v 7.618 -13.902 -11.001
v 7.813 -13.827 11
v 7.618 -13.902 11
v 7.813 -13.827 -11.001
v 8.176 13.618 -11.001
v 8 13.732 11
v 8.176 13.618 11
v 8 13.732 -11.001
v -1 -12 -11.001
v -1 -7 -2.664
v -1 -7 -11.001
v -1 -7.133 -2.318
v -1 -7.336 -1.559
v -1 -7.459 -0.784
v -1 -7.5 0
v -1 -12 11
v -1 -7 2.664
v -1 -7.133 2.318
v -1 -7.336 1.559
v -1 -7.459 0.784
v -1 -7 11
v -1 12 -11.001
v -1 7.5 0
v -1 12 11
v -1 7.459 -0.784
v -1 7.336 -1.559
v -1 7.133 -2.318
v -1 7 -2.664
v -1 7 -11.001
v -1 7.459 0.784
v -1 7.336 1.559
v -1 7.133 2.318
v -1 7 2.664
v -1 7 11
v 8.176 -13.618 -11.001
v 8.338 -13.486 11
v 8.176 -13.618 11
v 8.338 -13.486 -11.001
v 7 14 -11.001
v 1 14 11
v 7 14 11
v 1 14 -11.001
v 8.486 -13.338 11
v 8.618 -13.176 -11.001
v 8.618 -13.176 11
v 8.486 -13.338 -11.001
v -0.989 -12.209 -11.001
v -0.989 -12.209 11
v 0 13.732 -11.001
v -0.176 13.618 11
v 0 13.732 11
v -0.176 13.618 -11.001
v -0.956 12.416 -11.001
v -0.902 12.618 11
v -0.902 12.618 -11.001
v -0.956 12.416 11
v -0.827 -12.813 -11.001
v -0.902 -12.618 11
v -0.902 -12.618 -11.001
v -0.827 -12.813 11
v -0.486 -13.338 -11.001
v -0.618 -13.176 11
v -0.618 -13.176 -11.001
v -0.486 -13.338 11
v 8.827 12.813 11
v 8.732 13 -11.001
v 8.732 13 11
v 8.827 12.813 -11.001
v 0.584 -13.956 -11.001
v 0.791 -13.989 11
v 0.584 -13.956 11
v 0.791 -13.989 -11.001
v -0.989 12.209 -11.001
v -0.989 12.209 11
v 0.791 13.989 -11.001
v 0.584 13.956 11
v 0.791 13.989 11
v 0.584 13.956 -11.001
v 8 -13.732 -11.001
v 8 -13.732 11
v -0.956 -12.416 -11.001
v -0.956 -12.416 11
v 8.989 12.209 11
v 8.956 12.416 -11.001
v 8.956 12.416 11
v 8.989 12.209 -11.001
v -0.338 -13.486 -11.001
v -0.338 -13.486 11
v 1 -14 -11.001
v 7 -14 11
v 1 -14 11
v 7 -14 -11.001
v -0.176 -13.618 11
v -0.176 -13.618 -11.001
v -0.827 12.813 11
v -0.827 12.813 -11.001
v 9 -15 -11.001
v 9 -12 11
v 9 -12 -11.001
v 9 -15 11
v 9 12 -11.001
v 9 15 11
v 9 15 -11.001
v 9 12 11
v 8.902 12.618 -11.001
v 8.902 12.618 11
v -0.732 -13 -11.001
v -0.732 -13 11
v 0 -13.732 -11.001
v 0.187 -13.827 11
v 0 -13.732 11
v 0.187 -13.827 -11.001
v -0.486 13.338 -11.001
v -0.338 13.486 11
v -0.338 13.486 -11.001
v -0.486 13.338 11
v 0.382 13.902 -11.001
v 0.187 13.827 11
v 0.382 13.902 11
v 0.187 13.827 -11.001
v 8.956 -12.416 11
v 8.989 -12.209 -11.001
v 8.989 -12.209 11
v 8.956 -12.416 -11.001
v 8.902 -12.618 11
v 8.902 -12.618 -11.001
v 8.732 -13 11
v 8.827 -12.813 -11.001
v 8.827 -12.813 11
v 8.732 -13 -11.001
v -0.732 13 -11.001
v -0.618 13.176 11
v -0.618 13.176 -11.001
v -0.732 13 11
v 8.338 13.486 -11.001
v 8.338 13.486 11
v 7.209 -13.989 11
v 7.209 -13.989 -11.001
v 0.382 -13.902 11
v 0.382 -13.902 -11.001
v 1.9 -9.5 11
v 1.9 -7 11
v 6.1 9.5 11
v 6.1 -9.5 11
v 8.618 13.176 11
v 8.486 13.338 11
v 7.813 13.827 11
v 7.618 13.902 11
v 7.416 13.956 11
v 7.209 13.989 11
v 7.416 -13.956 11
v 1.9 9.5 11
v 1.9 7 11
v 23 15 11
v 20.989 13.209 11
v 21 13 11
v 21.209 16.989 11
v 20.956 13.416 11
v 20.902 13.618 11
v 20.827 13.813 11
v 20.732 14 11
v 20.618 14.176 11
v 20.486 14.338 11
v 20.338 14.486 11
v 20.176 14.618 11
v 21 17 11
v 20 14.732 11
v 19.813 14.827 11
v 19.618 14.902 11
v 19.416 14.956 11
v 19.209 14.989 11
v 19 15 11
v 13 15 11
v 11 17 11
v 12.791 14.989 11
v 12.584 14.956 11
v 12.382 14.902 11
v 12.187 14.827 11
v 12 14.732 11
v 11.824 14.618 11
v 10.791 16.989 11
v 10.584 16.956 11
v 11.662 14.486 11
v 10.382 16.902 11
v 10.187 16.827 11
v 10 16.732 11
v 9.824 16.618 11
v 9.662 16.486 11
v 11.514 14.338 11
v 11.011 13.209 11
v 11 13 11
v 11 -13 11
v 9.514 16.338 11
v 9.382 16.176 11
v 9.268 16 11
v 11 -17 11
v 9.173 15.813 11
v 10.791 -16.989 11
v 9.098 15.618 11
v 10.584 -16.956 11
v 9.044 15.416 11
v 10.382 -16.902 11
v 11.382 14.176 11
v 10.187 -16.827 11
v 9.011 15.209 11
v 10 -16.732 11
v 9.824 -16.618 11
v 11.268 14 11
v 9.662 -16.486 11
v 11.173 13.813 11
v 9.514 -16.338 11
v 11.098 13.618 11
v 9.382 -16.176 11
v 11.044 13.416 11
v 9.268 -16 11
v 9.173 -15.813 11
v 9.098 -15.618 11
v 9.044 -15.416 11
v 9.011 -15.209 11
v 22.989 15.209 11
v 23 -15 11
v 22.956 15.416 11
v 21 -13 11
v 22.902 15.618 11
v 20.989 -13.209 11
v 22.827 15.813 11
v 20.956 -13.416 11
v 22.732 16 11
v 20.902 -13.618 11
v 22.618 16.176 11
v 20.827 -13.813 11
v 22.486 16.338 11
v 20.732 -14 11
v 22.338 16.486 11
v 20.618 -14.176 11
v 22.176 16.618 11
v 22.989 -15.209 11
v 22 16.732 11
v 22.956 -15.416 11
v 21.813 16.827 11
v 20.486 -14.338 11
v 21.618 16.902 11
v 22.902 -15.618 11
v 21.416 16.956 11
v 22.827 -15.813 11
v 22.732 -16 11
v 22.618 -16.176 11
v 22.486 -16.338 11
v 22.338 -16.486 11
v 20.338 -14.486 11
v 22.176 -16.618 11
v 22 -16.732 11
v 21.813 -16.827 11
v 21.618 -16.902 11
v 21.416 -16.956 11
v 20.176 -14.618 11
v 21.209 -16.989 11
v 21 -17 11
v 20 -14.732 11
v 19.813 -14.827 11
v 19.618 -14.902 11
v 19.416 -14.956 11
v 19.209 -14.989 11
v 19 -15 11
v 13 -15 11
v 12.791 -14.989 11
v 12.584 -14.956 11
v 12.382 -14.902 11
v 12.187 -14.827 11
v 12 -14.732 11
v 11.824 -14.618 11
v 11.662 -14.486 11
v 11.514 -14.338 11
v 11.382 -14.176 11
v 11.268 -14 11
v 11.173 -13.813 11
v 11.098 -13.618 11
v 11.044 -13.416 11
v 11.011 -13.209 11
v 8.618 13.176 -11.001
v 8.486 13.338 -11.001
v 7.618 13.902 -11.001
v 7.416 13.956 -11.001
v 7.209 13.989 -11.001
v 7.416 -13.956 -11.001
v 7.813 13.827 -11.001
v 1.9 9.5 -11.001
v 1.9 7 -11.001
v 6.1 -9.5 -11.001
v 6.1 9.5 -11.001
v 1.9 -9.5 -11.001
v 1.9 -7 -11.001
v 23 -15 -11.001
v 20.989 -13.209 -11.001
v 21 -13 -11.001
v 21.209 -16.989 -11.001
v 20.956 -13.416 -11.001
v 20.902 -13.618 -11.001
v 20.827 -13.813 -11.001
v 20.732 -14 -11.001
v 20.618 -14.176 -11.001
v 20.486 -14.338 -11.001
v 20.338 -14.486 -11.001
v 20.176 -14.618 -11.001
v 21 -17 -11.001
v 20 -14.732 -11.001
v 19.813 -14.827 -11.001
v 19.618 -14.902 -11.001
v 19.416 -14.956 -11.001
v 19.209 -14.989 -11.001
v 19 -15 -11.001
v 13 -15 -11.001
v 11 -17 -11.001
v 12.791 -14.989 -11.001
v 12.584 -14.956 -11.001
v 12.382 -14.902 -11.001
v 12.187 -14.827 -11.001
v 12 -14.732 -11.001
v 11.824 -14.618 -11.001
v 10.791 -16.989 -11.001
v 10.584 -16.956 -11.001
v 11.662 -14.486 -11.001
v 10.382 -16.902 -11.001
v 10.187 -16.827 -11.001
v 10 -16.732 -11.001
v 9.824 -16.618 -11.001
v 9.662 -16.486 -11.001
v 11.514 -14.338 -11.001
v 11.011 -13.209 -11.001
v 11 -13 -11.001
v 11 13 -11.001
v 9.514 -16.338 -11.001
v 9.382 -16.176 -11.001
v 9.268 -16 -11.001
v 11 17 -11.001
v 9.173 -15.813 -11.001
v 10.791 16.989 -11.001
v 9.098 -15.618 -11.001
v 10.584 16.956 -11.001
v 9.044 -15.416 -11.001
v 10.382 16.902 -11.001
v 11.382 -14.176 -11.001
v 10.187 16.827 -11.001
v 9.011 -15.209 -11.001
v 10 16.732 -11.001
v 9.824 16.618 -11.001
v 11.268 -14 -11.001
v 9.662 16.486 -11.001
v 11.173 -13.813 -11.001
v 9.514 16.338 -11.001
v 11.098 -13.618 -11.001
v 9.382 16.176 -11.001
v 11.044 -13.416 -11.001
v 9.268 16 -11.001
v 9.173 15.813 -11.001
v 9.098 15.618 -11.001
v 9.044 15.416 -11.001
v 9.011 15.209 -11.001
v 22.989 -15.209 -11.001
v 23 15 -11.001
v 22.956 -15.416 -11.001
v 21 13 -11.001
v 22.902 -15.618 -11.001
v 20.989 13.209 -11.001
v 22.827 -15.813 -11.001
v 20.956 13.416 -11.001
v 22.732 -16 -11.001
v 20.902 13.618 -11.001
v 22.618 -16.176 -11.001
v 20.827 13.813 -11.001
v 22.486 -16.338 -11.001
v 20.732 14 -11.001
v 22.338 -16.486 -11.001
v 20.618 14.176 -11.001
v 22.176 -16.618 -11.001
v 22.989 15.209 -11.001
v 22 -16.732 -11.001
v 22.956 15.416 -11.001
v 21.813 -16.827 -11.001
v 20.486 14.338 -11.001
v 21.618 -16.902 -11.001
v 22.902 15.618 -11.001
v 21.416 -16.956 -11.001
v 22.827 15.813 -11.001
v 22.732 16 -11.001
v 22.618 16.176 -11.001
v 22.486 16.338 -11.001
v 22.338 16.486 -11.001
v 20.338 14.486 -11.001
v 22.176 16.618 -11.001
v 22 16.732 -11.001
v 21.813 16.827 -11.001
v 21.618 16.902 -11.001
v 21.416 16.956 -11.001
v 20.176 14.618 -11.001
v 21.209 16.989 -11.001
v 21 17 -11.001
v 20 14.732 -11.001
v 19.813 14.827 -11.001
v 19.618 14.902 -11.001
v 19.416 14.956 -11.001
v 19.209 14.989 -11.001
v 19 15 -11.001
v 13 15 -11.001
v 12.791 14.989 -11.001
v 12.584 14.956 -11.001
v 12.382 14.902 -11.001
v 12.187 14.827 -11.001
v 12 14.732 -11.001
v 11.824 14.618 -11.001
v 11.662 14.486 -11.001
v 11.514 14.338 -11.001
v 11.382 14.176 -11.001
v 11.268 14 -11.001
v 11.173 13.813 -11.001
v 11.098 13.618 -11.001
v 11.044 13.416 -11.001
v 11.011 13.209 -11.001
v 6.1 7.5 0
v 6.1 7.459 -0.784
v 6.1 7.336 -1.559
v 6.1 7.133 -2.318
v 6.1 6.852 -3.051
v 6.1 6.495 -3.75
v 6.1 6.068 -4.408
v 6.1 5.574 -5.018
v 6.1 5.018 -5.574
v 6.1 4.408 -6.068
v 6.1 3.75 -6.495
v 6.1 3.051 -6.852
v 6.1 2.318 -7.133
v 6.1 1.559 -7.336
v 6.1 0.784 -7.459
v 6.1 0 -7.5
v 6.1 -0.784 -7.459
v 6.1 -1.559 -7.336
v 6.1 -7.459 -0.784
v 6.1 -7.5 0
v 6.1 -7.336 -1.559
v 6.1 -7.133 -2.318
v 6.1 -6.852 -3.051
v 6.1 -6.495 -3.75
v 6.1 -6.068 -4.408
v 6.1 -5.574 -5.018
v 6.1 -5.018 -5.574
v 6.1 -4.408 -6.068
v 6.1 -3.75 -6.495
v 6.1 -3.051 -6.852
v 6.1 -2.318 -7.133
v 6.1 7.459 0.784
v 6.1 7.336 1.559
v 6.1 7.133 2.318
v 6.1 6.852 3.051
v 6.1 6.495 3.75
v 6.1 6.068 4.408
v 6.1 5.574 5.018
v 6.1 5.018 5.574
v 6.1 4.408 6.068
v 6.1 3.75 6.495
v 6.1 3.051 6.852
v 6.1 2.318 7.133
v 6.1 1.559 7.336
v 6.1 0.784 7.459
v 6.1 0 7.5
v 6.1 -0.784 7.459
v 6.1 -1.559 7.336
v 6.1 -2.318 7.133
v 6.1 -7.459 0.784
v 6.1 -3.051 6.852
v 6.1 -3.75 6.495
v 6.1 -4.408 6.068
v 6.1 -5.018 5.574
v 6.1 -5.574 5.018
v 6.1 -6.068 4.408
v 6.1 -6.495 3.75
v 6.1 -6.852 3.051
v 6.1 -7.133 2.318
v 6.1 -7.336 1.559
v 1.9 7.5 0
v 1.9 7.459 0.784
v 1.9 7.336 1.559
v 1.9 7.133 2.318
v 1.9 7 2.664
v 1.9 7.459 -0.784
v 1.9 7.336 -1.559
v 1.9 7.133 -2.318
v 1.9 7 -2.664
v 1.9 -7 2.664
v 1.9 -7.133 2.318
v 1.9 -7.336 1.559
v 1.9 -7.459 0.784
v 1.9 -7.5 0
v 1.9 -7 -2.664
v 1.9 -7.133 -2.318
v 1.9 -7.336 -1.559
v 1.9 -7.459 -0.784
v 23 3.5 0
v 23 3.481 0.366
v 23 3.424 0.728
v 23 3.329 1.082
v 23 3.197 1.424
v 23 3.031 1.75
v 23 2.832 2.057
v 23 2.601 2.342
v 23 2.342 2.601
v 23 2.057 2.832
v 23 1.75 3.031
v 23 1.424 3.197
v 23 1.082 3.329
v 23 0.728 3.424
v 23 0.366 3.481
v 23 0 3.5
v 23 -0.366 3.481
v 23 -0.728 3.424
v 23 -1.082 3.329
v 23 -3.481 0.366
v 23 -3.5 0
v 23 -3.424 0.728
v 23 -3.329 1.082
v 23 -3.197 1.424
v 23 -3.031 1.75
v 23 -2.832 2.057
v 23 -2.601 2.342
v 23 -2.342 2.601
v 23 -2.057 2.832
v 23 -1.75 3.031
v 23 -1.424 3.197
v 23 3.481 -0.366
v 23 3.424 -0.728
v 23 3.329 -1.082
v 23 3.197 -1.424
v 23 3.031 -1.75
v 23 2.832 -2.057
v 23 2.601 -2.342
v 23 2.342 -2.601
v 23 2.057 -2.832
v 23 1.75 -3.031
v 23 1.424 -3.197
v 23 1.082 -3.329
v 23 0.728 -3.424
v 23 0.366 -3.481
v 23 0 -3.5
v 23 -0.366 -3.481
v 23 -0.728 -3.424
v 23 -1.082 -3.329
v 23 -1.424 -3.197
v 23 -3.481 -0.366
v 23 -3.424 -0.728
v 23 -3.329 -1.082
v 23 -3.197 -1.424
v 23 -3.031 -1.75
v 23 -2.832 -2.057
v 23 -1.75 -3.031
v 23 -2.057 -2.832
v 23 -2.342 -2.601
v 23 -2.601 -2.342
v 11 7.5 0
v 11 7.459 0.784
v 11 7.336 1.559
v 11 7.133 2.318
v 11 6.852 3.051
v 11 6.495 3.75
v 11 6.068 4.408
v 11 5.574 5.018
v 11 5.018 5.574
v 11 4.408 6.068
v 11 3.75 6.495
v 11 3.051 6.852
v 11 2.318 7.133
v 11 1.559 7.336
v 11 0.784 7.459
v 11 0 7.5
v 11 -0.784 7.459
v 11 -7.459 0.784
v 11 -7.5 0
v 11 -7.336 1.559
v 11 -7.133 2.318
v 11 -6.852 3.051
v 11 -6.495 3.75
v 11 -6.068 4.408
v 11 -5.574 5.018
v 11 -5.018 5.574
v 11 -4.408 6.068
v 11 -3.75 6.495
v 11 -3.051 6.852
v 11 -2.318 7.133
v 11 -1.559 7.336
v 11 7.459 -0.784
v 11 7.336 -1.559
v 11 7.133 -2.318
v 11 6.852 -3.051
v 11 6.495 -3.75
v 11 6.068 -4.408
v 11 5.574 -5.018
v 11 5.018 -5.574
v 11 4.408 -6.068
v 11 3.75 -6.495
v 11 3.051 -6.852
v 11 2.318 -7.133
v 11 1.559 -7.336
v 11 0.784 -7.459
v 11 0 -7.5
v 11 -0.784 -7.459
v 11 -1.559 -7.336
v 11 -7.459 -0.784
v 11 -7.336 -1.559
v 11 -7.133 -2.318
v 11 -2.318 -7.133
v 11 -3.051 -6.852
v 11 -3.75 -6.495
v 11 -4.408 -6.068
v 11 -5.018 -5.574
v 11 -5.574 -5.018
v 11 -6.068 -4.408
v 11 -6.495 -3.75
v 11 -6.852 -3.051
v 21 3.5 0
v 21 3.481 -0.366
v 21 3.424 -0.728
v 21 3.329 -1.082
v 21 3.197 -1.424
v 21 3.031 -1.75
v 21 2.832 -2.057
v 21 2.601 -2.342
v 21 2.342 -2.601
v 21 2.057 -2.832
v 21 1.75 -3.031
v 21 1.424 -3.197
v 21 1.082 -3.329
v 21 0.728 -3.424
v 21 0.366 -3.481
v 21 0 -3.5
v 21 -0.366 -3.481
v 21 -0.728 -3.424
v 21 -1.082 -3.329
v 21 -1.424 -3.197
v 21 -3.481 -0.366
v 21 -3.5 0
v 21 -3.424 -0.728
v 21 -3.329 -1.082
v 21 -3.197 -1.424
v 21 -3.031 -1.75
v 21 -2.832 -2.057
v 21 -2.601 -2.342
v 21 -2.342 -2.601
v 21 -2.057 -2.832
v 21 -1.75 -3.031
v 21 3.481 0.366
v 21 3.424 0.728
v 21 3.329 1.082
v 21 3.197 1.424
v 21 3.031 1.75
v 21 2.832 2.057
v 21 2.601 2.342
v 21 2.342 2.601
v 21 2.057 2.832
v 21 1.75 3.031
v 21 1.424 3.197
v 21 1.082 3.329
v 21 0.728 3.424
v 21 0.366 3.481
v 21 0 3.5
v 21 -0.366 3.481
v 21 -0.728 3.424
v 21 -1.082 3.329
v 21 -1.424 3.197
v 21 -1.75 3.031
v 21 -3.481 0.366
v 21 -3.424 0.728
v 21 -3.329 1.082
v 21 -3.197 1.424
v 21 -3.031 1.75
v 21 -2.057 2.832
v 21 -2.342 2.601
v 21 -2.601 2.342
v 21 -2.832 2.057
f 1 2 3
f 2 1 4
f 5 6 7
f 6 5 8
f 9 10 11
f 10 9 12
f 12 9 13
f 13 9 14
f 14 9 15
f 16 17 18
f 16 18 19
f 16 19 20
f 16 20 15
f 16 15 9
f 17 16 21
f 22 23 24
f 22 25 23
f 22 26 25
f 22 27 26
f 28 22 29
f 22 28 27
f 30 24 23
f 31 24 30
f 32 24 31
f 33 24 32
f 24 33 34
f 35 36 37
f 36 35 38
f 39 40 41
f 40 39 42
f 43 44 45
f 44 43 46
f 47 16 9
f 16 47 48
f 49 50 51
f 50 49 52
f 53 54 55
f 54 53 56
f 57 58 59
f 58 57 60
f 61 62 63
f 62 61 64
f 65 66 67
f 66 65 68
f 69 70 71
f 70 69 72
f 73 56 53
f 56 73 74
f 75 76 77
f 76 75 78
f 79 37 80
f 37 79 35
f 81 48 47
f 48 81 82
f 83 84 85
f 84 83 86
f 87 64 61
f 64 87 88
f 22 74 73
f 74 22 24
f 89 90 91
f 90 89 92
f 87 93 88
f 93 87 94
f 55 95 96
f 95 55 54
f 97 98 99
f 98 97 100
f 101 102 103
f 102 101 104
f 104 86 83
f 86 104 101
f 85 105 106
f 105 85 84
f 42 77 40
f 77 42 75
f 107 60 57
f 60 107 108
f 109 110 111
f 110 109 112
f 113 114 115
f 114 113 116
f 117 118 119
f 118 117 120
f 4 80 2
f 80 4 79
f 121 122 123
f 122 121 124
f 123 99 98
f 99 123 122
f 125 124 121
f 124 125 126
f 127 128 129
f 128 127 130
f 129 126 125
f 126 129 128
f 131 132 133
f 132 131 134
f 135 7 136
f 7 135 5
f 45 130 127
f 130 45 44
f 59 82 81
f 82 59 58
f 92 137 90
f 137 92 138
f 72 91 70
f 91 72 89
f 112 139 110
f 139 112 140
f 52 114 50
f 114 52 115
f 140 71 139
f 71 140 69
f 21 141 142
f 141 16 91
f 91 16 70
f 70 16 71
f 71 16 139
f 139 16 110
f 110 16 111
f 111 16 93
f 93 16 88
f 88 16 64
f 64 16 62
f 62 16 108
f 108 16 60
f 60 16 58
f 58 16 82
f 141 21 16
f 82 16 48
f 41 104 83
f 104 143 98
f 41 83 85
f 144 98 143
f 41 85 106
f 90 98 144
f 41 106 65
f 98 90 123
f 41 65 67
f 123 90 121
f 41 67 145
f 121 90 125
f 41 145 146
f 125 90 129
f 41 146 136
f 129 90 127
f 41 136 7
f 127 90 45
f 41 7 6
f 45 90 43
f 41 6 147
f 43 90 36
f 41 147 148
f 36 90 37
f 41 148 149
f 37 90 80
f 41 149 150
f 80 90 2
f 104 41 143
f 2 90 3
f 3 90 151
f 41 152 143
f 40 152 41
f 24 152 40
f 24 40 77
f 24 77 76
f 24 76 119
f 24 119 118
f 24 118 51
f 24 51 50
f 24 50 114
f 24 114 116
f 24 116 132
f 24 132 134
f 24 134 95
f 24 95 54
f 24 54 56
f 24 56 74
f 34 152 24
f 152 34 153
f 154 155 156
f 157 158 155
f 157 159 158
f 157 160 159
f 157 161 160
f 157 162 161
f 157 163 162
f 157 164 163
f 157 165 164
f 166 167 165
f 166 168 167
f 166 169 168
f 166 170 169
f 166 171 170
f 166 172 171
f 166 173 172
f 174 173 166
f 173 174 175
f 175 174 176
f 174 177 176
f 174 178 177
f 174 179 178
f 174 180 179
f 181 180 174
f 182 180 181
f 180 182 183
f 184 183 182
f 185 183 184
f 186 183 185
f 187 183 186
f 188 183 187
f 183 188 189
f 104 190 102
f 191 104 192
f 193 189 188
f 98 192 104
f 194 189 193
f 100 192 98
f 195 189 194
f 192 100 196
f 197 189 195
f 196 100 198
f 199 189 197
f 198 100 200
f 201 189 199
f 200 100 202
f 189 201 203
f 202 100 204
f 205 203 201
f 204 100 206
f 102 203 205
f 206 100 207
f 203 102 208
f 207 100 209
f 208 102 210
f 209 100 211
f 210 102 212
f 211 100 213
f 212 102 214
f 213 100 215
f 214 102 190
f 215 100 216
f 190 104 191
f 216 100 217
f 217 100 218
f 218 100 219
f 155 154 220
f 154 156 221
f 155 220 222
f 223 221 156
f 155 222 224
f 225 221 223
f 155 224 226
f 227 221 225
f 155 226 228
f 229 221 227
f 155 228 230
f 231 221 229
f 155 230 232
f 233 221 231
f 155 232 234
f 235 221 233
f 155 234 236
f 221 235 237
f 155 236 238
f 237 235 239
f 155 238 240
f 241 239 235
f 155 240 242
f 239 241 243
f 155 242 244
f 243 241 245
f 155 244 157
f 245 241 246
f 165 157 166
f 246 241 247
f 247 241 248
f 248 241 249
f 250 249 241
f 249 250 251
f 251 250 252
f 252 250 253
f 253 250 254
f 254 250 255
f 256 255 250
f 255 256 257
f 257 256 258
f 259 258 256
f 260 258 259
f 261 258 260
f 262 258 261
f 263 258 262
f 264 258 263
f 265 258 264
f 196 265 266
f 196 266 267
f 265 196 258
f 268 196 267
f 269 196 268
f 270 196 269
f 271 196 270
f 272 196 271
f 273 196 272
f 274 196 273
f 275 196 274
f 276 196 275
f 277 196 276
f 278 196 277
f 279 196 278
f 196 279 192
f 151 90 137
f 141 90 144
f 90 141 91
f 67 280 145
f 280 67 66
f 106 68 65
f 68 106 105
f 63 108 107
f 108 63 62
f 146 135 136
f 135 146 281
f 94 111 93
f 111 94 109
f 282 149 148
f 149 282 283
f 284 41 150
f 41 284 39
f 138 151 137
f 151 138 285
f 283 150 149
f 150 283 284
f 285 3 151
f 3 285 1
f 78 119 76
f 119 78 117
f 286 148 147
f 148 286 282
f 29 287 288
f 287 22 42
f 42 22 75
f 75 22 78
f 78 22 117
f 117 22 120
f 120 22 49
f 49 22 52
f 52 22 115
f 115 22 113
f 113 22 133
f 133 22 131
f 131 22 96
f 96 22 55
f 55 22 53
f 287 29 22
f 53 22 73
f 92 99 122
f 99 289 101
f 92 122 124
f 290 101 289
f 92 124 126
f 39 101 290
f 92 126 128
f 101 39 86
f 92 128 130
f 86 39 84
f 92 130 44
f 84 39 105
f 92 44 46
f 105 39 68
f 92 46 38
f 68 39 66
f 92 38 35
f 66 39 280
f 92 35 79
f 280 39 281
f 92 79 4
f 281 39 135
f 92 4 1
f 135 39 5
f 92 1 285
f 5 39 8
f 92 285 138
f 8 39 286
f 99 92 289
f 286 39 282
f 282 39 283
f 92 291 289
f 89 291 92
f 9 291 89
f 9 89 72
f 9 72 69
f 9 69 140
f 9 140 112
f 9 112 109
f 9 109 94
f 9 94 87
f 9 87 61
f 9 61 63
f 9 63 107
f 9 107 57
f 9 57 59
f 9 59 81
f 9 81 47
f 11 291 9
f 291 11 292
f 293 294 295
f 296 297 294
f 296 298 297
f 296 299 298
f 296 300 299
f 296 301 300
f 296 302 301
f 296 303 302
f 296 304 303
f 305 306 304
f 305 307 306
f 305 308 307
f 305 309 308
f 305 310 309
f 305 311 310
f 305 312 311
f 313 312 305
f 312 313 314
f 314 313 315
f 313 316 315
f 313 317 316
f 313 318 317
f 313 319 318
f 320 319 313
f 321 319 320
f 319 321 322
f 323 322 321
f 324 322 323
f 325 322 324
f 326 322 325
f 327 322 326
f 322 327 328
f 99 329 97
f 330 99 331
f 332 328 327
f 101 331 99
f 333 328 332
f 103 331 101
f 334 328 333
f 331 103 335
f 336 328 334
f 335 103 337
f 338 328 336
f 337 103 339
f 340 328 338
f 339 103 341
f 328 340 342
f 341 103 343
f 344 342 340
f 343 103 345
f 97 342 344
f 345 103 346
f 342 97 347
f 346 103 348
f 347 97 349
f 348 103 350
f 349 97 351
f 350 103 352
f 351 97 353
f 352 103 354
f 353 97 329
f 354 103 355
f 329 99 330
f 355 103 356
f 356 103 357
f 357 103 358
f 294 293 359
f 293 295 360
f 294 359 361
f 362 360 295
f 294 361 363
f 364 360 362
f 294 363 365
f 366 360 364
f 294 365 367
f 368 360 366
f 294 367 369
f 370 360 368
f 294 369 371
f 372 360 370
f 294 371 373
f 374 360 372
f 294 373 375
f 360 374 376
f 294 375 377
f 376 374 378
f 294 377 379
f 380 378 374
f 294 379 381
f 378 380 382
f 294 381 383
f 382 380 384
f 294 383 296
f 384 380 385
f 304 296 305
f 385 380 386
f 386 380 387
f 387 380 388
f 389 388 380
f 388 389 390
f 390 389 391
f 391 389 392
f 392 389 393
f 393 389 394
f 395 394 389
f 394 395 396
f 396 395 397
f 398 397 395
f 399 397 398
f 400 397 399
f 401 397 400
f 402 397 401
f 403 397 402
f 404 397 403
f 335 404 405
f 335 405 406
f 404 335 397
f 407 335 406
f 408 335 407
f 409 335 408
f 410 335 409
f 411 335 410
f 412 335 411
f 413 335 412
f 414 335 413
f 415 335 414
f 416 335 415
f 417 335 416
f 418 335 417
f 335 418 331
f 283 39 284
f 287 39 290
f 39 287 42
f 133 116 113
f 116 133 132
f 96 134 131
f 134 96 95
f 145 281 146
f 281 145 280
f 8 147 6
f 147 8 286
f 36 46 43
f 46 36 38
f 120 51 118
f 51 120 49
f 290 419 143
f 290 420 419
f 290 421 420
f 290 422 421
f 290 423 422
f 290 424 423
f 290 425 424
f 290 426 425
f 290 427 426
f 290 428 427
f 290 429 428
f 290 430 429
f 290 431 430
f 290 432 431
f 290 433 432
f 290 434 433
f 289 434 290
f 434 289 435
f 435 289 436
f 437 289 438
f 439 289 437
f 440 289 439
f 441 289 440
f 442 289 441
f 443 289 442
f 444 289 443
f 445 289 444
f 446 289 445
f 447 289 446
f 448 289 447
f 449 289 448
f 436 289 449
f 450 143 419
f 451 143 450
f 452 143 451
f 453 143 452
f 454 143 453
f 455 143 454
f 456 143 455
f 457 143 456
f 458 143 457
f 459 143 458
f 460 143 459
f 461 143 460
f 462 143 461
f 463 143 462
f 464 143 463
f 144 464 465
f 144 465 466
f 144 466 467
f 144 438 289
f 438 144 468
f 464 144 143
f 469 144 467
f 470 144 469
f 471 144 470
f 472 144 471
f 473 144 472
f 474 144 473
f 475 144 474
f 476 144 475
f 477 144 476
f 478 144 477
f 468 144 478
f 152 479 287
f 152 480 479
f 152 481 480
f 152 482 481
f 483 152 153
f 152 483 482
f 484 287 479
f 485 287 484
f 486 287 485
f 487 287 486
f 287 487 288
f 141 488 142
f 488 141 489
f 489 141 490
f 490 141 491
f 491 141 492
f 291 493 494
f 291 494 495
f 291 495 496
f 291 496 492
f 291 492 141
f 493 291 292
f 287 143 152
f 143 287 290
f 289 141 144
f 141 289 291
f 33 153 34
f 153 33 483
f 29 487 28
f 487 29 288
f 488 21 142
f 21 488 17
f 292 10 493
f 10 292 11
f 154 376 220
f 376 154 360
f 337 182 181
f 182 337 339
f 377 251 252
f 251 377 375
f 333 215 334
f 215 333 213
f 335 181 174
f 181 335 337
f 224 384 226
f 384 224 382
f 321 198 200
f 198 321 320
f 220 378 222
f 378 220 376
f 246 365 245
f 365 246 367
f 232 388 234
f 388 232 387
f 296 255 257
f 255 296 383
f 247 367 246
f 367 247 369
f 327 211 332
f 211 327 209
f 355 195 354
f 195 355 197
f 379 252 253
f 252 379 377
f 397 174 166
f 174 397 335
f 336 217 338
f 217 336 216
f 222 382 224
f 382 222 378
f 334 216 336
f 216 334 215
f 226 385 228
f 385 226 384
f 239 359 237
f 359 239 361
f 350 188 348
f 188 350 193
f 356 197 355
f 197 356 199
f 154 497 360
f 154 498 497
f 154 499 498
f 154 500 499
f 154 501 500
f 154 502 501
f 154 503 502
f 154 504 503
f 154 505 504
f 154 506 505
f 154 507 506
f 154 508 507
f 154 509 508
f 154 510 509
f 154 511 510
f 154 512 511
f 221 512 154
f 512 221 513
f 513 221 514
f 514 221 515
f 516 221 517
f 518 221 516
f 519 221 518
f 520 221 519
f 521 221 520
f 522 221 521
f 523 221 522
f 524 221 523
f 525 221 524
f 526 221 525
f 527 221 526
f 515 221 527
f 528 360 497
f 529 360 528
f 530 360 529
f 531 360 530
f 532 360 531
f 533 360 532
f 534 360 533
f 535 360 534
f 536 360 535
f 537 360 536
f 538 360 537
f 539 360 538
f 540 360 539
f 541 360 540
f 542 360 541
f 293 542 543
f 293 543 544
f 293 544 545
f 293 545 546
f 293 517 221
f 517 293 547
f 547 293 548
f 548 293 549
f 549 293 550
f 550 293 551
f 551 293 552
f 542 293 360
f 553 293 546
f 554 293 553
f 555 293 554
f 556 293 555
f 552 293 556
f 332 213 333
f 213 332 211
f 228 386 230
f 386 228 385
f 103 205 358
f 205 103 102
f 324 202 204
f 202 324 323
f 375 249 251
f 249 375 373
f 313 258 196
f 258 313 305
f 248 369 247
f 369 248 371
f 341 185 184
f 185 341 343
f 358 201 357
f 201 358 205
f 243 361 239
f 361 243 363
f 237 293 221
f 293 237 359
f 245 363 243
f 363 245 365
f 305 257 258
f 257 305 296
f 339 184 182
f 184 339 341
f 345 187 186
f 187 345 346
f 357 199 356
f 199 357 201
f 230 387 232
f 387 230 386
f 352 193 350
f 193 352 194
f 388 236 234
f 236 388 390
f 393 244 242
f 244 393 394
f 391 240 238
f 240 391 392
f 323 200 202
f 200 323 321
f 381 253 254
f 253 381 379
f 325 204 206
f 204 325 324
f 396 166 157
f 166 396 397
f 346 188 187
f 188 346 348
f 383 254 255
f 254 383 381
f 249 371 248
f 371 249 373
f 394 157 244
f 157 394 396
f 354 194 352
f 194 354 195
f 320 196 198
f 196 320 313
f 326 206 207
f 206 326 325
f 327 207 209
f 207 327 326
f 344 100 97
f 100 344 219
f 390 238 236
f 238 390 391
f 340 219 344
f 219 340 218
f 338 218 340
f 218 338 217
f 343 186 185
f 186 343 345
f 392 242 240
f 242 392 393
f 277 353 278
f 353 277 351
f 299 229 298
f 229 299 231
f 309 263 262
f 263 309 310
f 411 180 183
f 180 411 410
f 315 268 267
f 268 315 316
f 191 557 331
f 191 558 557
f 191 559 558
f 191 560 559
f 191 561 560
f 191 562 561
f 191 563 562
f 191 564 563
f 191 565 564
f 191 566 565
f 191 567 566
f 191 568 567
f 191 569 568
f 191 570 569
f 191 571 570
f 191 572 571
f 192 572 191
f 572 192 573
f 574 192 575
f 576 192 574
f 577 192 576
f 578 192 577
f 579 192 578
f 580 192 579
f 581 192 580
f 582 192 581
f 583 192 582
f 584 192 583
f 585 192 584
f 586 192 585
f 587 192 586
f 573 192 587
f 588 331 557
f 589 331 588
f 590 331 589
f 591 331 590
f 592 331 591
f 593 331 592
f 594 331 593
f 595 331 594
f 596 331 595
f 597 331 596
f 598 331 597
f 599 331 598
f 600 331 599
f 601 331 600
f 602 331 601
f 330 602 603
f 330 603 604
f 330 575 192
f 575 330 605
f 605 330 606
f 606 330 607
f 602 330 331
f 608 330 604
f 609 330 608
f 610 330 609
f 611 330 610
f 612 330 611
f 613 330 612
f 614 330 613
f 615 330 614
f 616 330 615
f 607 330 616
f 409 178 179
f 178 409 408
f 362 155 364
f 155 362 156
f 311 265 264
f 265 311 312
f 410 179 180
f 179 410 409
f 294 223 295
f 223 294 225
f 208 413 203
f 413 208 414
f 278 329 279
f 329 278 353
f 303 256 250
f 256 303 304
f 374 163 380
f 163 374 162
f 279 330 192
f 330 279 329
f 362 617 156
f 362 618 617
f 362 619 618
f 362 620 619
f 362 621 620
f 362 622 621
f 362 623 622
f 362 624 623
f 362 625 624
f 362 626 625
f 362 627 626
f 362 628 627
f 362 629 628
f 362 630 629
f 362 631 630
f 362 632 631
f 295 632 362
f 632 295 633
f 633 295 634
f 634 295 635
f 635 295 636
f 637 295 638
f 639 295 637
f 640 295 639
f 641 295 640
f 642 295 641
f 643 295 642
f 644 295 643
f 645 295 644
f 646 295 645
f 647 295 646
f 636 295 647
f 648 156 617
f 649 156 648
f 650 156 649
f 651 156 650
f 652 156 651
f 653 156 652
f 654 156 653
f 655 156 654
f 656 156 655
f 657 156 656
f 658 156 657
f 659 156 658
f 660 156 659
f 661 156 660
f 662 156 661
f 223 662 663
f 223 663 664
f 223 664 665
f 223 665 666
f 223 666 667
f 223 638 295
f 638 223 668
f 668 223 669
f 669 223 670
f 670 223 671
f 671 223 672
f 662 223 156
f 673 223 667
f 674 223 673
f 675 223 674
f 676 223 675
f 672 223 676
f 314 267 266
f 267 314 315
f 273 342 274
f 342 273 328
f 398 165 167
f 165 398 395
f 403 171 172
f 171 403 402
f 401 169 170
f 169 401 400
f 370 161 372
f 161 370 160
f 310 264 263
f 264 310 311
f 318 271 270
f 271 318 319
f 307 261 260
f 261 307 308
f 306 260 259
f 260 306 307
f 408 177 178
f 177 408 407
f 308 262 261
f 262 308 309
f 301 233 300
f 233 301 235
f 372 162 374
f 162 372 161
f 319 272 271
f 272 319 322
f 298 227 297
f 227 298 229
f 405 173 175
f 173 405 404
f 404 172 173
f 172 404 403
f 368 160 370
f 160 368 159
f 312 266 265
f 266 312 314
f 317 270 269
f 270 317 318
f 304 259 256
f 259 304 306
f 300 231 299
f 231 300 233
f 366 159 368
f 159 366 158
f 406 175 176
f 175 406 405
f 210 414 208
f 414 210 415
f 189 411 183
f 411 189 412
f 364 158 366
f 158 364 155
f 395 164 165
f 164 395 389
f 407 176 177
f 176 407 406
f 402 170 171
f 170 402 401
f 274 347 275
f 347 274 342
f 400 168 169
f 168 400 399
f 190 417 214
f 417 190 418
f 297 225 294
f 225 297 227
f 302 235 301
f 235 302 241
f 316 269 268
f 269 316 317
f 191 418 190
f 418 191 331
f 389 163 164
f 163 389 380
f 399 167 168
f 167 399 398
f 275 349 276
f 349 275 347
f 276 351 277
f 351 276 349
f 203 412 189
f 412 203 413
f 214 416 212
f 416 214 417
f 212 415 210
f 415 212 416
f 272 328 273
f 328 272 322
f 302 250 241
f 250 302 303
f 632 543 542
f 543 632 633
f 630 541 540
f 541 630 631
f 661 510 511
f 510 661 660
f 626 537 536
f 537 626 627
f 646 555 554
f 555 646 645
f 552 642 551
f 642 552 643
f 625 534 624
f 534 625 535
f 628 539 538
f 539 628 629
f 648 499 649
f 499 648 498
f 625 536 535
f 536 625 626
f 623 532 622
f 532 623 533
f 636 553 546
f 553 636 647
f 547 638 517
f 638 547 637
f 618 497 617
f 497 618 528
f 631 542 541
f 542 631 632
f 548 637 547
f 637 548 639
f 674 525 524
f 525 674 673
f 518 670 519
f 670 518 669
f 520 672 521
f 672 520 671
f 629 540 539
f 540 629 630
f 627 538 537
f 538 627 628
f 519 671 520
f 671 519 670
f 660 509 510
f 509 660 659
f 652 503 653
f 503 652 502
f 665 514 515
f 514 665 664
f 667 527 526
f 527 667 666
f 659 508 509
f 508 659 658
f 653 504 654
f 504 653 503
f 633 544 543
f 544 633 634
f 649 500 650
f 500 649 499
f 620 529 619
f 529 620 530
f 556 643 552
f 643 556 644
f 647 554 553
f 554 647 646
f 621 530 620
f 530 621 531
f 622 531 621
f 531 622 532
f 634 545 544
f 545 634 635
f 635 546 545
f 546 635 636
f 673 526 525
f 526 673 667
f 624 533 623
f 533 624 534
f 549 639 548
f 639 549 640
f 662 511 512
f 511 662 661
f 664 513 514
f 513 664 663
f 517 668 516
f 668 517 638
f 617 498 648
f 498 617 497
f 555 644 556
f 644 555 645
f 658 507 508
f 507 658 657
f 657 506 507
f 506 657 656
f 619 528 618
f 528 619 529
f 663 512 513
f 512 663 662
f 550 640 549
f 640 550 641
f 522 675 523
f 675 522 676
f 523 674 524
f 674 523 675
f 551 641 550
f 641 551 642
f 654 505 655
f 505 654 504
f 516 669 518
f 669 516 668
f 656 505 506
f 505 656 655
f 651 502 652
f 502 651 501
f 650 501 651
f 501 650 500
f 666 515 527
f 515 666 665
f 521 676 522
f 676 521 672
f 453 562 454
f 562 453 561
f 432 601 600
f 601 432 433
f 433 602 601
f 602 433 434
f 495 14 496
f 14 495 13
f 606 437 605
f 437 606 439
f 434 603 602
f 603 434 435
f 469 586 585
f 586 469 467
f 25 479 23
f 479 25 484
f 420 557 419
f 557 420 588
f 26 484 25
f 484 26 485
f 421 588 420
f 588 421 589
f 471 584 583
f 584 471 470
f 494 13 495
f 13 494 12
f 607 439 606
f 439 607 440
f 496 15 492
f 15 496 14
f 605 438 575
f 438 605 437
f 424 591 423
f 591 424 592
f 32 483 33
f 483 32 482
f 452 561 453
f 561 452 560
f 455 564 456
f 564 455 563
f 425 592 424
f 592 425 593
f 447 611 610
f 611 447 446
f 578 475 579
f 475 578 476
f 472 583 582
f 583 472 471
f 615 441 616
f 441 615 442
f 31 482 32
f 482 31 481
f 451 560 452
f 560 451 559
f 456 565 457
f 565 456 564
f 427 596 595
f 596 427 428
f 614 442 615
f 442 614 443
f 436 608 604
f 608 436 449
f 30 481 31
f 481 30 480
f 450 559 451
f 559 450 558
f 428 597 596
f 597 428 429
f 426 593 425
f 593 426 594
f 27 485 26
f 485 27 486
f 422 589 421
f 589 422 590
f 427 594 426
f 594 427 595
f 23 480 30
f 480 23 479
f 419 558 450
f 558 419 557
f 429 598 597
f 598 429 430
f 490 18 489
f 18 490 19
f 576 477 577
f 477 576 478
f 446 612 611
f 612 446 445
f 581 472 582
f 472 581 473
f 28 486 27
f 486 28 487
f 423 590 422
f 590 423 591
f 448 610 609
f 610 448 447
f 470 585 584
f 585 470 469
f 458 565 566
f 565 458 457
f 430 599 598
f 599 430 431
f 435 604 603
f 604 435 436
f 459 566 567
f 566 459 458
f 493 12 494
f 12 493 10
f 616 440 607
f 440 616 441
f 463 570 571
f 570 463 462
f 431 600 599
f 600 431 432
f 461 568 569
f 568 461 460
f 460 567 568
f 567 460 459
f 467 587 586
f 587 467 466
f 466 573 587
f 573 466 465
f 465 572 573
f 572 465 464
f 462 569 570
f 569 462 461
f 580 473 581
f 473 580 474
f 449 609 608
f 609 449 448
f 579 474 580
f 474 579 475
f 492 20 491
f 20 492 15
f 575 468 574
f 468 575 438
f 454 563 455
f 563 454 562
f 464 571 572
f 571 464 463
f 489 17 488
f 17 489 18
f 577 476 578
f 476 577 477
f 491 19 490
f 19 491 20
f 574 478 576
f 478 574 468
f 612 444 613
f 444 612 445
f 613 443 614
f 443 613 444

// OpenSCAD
nutOuterR = 7.5;
cameraHolderKnobR=14;
cameraHolderKnobH=8;
spindelR=3.5;
railHolderLength = 2*cameraHolderKnobR-6;
railHolderWidth = 28;

$fn=60;

module railHolder(length,width) {
	difference() {
     minkowski() {
		 translate([0,0,8/2]) cube([length,width-4,6],center=true);
       rotate([0,90,0]) cylinder(r=2,h=0.001);
     }
	  #translate([0,0,2+4/2]) cube([length+20,19,4.2],center=true);
	  #translate([0,0,0]) cube([length+20,14,4],center=true);
	}
}

module cameraHolder() {
  difference() {
    minkowski() {
	   cube([2*cameraHolderKnobR-6,2*cameraHolderKnobR+2,cameraHolderKnobH+2],center=true);
      rotate([0,90,0]) cylinder(r=2,h=0.001);
    }
    minkowski() {
      #cube([2*cameraHolderKnobR,2*cameraHolderKnobR-2,cameraHolderKnobH-2],center=true);
      rotate([0,90,0]) cylinder(r=2,h=0.001);
    }
    #translate([0,0,cameraHolderKnobH]) cylinder(r=spindelR,h=20,center=true);
  }  
}

rotate([0,90,0]) difference() {
  union() {
    railHolder(railHolderLength,railHolderWidth);
    translate([0,0,9+(cameraHolderKnobH+6)/2]) cameraHolder();
  }
  #translate([0,0,0]) cylinder(r=nutOuterR,h=25,center=true);
}

/*cube([10,2*cameraHolderKnobR,100],center=true);*/
/*translate([0,0,1]) cube([10,2*cameraHolderKnobR,2],center=true);*/
